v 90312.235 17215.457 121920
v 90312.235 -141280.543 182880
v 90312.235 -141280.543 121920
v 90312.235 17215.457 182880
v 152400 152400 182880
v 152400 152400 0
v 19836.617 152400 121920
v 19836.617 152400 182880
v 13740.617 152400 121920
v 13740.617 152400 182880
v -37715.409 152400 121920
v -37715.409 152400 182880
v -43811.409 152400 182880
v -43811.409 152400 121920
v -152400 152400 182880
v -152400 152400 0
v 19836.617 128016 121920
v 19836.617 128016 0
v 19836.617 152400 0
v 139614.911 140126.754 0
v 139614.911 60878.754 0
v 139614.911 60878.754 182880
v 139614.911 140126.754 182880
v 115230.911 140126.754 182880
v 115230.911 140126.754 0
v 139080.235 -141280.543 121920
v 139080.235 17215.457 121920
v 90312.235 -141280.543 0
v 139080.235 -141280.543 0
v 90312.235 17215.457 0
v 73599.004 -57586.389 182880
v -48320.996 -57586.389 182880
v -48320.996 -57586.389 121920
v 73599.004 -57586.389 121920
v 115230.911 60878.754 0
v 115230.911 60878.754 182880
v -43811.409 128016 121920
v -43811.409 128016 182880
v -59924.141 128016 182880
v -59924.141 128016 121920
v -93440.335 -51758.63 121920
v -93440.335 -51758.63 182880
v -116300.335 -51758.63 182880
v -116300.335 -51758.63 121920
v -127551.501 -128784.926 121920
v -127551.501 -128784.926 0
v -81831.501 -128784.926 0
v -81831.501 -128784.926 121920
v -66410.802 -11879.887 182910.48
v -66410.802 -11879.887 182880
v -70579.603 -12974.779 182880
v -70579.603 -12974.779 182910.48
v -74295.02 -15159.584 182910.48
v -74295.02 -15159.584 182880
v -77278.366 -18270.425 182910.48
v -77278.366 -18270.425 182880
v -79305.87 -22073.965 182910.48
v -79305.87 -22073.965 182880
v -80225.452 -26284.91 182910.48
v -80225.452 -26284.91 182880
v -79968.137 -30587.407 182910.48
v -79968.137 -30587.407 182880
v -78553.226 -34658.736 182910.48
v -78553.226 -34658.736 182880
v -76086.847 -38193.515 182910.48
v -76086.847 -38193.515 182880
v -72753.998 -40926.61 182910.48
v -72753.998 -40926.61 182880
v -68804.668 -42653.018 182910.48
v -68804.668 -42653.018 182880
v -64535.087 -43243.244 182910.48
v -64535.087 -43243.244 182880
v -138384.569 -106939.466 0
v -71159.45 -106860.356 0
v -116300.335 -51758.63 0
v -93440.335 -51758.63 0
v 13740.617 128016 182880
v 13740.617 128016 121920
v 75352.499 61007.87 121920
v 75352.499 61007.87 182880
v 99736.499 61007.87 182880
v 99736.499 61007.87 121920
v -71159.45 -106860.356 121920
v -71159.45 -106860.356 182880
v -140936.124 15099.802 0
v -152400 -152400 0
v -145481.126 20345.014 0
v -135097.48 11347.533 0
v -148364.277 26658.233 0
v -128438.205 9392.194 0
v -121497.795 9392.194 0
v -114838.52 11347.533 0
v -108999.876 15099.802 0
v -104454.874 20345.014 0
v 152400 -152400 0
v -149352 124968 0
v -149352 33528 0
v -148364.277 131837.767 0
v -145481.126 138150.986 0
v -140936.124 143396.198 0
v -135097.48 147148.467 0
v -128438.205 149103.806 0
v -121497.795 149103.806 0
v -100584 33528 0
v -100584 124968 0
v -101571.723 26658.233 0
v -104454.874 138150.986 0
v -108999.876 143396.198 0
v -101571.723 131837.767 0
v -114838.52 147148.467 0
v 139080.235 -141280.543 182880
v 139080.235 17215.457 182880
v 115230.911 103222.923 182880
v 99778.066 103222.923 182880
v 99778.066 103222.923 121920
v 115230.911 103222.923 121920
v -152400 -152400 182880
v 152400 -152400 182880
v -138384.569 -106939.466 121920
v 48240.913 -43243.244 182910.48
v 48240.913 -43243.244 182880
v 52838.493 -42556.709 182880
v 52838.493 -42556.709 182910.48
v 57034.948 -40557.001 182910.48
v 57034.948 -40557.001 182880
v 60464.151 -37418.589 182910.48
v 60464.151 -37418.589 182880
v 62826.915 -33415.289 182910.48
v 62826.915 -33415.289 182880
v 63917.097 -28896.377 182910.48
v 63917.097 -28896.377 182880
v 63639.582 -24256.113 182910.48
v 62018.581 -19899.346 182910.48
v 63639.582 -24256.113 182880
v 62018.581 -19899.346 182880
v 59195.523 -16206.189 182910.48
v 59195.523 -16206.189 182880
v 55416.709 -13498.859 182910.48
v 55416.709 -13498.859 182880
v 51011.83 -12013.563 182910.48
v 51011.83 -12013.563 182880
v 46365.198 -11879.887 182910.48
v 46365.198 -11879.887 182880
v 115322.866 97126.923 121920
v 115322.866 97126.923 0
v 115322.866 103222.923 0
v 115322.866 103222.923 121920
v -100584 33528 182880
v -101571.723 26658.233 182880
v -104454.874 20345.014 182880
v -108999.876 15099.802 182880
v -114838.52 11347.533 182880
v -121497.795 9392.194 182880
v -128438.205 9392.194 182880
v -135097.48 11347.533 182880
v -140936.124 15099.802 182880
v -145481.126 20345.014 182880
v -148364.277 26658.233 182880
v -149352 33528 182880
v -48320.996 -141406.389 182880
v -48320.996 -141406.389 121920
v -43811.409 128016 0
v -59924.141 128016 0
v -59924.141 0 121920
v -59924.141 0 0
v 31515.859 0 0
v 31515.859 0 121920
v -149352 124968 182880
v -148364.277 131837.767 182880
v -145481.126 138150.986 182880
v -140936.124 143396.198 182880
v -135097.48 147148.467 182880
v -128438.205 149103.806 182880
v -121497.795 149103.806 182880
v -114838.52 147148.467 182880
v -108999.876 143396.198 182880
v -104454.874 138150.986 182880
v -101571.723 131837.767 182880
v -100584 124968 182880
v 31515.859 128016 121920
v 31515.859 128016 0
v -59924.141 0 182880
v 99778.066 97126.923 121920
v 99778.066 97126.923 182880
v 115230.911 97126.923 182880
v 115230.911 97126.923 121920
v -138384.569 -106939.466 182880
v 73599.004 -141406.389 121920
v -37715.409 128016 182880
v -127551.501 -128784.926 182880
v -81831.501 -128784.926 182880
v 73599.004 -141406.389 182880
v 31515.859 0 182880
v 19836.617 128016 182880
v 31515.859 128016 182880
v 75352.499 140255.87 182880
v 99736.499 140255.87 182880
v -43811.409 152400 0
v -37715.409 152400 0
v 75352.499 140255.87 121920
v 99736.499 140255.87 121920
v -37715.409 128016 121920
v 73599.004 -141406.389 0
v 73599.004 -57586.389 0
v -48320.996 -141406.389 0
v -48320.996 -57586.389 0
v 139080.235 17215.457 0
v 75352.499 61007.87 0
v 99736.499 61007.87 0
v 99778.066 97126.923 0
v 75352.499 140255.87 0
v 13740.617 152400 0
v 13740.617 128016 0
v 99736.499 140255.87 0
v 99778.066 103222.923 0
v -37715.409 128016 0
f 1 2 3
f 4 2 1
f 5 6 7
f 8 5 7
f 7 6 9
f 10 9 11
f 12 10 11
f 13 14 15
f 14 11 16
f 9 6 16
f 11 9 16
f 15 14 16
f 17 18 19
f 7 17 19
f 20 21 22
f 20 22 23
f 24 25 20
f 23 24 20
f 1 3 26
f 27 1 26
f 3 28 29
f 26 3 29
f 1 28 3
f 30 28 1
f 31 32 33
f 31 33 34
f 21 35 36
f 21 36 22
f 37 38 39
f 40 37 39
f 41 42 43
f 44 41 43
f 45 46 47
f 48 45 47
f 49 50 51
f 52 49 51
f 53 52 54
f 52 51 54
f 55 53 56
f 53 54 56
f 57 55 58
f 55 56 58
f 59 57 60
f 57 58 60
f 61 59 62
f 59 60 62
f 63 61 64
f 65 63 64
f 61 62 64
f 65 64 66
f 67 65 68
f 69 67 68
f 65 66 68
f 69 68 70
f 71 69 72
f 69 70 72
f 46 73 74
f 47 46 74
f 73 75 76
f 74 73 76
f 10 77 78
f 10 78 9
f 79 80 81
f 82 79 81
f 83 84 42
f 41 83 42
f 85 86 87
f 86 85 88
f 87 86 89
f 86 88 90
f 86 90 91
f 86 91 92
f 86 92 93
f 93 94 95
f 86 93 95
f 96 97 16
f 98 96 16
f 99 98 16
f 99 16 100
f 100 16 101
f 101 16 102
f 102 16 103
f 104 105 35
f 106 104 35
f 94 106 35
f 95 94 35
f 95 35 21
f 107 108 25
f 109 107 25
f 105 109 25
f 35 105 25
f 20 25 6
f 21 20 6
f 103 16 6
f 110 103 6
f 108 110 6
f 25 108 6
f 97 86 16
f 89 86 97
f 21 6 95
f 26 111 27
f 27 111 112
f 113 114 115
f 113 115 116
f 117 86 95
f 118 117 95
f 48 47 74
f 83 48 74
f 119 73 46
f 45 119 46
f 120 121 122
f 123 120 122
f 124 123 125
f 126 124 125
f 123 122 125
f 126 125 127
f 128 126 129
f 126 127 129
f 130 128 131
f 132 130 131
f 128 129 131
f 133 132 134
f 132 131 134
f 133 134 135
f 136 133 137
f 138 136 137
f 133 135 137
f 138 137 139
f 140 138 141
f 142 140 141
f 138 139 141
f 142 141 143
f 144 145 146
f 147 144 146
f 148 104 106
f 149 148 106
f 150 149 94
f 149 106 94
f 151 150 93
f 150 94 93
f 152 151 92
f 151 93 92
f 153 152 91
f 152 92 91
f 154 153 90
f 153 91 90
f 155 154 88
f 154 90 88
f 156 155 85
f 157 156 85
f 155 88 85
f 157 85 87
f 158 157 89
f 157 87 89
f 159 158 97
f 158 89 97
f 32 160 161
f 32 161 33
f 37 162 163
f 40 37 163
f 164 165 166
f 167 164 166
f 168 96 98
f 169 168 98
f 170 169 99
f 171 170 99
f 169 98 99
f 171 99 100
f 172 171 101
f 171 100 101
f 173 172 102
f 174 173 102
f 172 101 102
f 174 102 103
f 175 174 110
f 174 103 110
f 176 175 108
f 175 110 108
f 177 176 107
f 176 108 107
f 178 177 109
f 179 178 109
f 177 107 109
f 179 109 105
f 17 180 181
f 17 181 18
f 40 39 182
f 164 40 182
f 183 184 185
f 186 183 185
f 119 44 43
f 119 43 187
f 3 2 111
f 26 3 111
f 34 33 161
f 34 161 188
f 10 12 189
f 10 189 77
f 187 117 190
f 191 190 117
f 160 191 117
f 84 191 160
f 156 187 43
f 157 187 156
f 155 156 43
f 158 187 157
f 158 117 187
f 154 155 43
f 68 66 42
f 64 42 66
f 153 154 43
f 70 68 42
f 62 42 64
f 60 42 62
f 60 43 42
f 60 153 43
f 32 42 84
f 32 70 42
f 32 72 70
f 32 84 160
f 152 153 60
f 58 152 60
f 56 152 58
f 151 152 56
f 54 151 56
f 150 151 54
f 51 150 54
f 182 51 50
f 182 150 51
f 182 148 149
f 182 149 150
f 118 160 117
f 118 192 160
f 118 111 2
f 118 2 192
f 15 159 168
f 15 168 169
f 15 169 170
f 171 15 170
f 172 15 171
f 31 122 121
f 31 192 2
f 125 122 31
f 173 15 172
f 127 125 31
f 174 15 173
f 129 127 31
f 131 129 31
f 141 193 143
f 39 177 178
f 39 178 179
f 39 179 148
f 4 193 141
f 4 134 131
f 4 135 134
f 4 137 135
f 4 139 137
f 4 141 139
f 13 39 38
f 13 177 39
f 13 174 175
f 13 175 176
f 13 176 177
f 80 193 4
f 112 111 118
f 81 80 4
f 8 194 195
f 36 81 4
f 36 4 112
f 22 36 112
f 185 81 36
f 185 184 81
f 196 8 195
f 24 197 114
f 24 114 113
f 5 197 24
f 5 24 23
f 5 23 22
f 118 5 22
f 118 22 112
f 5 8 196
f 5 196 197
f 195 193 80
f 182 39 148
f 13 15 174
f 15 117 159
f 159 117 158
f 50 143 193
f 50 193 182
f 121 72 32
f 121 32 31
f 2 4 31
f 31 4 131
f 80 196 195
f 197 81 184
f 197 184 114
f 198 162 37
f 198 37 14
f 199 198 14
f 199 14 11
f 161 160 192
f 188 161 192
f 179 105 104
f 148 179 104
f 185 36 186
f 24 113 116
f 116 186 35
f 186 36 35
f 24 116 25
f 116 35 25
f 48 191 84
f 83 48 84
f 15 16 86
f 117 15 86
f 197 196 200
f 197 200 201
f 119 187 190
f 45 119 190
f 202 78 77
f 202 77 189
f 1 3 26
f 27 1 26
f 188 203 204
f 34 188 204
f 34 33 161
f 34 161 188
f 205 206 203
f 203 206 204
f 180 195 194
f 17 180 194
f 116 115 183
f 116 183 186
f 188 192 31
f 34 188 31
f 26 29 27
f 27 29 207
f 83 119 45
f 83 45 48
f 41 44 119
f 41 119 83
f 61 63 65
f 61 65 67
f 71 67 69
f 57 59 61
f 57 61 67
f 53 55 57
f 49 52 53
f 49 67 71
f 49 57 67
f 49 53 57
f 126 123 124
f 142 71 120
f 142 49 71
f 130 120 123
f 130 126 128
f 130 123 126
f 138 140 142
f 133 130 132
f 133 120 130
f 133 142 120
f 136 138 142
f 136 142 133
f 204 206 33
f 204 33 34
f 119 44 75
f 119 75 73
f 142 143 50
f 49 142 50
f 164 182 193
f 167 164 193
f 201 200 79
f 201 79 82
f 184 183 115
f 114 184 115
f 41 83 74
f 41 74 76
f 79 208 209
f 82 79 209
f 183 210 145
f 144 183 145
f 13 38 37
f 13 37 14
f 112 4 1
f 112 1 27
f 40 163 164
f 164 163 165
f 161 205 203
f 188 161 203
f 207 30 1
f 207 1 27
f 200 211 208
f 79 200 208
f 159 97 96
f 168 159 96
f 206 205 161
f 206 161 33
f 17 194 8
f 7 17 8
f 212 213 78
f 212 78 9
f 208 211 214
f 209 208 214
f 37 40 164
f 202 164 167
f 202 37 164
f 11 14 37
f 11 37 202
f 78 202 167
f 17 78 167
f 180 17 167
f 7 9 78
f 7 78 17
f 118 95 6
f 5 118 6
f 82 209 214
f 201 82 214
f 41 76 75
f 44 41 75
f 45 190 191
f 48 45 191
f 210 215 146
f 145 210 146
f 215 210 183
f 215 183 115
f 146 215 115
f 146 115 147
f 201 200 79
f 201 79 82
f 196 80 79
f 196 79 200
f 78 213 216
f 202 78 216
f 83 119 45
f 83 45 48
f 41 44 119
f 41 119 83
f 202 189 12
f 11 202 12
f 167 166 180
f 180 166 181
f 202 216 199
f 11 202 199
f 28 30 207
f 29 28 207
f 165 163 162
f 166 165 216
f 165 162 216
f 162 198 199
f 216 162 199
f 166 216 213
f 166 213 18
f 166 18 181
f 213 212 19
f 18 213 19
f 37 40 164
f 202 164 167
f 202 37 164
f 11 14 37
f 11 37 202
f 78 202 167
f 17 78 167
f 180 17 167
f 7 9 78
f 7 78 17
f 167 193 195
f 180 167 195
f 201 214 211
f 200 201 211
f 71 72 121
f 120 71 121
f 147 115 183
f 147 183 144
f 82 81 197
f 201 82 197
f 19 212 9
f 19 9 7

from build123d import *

# Parameters (mm, degrees)
F1_W        = 15544.8
F1_H        = 6096
F7_DEPTH    = 182880
F4_W        = 6096
F4_H        = 24384
F0_W        = 24384
F0_H        = 79248
F0_W_2      = 3048
F0_H_2      = 27432
F5_W        = 121920
F5_H        = 83820
F3_W        = 48768.0000000001
F3_H        = 158496
F8_DEPTH    = 60960
F7_FACE_W   = 15544.8
F7_FACE_H   = 6096
F7_FACE_W_2 = 24384
F7_FACE_H_2 = 79248
F7_FACE_W_3 = 48768.0000000001
F7_FACE_H_3 = 158496
F7_FACE_W_4 = 121920
F7_FACE_H_4 = 83820
F9_DEPTH    = 60960
F17_DEPTH   = 30.48


# Not quite as in the source:
# - the program builds the solid bodies; features that only make, move or delete a surface that nothing else refers to are left out


with BuildPart() as f7:
    # F1 (on face) → F7 (new body)
    with BuildSketch(Plane.XY):
        with Locations((107550.465918614, 100174.9229431152)):
            Rectangle(F1_W, F1_H)
    extrude(amount=F7_DEPTH)


with BuildPart() as f7b:
    # F6 (on face) → F7, piece 2 (new body)
    with BuildSketch(Plane.XY):
        Polygon((-138384.5689090631, -106939.4663491444), (-127551.5013376337, -128784.9259001094), (-81831.5013376337, -128784.9259001094), (-71159.4495909771, -106860.3559495566), (-93440.3353419917, -51758.629786484), (-116300.3353419917, -51758.629786484), align=None)
    extrude(amount=F7_DEPTH)


with BuildPart() as f7c:
    # F4 (on face) → F7, piece 3 (new body)
    with BuildSketch(Plane.XY):
        Polygon((-43811.408996582, 128016), (-59924.1409301758, 128016), (-59924.1409301758, 0), (31515.8590698242, 0), (31515.8590698242, 128016), (19836.6167984009, 128016), (13740.6167984009, 128016), (-37715.408996582, 128016), align=None)
        with Locations((-40763.408996582, 140208)):
            Rectangle(F4_W, F4_H)
        with Locations((16788.6167984009, 140208)):
            Rectangle(F4_W, F4_H)
    extrude(amount=F7_DEPTH)


with BuildPart() as f7d:
    # F0 (on Top) → F7, piece 4 (new body)
    with BuildSketch(Plane.XY):
        Polygon((152400, -152400), (152400, 152400), (-149352, 152400), (-149352, 124968), (-152400.0000000001, 124968), (-152400, -152400), align=None)
        with BuildLine():
            Line((-149352, 33528), (-149352, 124968))
            ThreePointArc((-149352, 124968), (-142210.0917524528, 142210.0917524528), (-124968, 149352))
            ThreePointArc((-124968, 149352), (-107725.9082475473, 142210.0917524527), (-100584.0000000001, 124968))
            Line((-100584, 124968), (-100584, 33528))
            ThreePointArc((-100584, 33528), (-124968, 9144), (-149352, 33528))
        make_face(mode=Mode.SUBTRACT)
        with Locations((127422.9112548828, 100502.7536621094)):
            Rectangle(F0_W, F0_H, mode=Mode.SUBTRACT)
        with Locations((-150876, 138684)):
            Rectangle(F0_W_2, F0_H_2)
    extrude(amount=F7_DEPTH)


with BuildPart() as f7e:
    # F5 (on face) → F7, piece 5 (new body)
    with BuildSketch(Plane.XY):
        with Locations((12639.0037536621, -99496.3893408147)):
            Rectangle(F5_W, F5_H)
    extrude(amount=F7_DEPTH)


with BuildPart() as f7f:
    # F2 (on face) → F7, piece 6 (new body)
    with BuildSketch(Plane.XY):
        Polygon((99736.4994638944, 100631.8702697754), (99736.4994638944, 140255.8702697754), (75352.4994638944, 140255.8702697754), (75352.4994638944, 61007.8702697754), (99736.4994638944, 61007.8702697754), (99736.4994638944, 90581.0760098918), align=None)
    extrude(amount=F7_DEPTH)


with BuildPart() as f7g:
    # F3 (on face) → F7, piece 7 (new body)
    with BuildSketch(Plane.XY):
        with Locations((114696.2353164215, -62032.543182373)):
            Rectangle(F3_W, F3_H)
    extrude(amount=F7_DEPTH)


with BuildPart() as f8_tool:
    # F8 (cut): a face of the model
    f8_faces = [f7c.part.faces().sort_by_distance(p)[0] for p in [
        (-14149.2370334306, 65895.306501548, 182880),
    ]]
    extrude(f8_faces, amount=-F8_DEPTH)


with BuildPart() as f7c_1:
    add(f7c.part)

    # F8: cut by f8_tool
    add(f8_tool.part, mode=Mode.SUBTRACT)


with BuildPart() as f7d_1:
    add(f7d.part)

    # F8: cut by f8_tool
    add(f8_tool.part, mode=Mode.SUBTRACT)


with BuildPart() as f9_tool:
    # F7_face (on face) → F9 (new body)
    with BuildSketch(Plane(origin=(-14149.2370334306, 65895.306501548, 182880), x_dir=(1, 0, 0), z_dir=(0, 0, 1))):
        with Locations((121699.7029520446, 34279.6164415673)):
            Rectangle(F7_FACE_W, F7_FACE_H)
        Polygon((-124235.3318756325, -172834.7728506924), (-113402.2643042031, -194680.2324016574), (-67682.2643042031, -194680.2324016574), (-57010.2125575465, -172755.6624511046), (-79291.0983085611, -117653.936288032), (-102151.0983085611, -117653.936288032), align=None)
        with Locations((101693.736497325, 34736.5637682274)):
            Rectangle(F7_FACE_W_2, F7_FACE_H_2)
        with Locations((128845.4723498522, -127927.849683921)):
            Rectangle(F7_FACE_W_3, F7_FACE_H_3)
        with Locations((26788.2407870928, -165391.6958423627)):
            Rectangle(F7_FACE_W_4, F7_FACE_H_4)
    extrude(amount=-F9_DEPTH)


with BuildPart() as f7_1:
    add(f7.part)

    # F9: cut by f9_tool
    add(f9_tool.part, mode=Mode.SUBTRACT)


with BuildPart() as f7b_1:
    add(f7b.part)

    # F9: cut by f9_tool
    add(f9_tool.part, mode=Mode.SUBTRACT)


with BuildPart() as f7d_2:
    add(f7d_1.part)

    # F9: cut by f9_tool
    add(f9_tool.part, mode=Mode.SUBTRACT)

    # F16 (on face) → F17 (join)
    with BuildSketch(Plane.XY.offset(182880)):
        with BuildLine():
            ThreePointArc((-66410.8023529053, -11879.8866271973), (-80244.7849895234, -28445.0095732925), (-64535.0865011215, -43243.2441711426))
            Line((-64535.0865011215, -43243.2441711426), (48240.9134988785, -43243.2441711426))
            ThreePointArc((48240.9134988785, -43243.2441711426), (63950.6119872804, -26565.9422291696), (46365.1976470947, -11879.8866271973))
            Line((46365.1976470947, -11879.8866271973), (-66410.8023529053, -11879.8866271973))
        make_face()
    extrude(amount=F17_DEPTH)


with BuildPart() as f7e_1:
    add(f7e.part)

    # F9: cut by f9_tool
    add(f9_tool.part, mode=Mode.SUBTRACT)


with BuildPart() as f7f_1:
    add(f7f.part)

    # F9: cut by f9_tool
    add(f9_tool.part, mode=Mode.SUBTRACT)


with BuildPart() as f7g_1:
    add(f7g.part)

    # F9: cut by f9_tool
    add(f9_tool.part, mode=Mode.SUBTRACT)


solid = Compound([f7c_1.part, f7_1.part, f7b_1.part, f7d_2.part, f7e_1.part, f7f_1.part, f7g_1.part])
